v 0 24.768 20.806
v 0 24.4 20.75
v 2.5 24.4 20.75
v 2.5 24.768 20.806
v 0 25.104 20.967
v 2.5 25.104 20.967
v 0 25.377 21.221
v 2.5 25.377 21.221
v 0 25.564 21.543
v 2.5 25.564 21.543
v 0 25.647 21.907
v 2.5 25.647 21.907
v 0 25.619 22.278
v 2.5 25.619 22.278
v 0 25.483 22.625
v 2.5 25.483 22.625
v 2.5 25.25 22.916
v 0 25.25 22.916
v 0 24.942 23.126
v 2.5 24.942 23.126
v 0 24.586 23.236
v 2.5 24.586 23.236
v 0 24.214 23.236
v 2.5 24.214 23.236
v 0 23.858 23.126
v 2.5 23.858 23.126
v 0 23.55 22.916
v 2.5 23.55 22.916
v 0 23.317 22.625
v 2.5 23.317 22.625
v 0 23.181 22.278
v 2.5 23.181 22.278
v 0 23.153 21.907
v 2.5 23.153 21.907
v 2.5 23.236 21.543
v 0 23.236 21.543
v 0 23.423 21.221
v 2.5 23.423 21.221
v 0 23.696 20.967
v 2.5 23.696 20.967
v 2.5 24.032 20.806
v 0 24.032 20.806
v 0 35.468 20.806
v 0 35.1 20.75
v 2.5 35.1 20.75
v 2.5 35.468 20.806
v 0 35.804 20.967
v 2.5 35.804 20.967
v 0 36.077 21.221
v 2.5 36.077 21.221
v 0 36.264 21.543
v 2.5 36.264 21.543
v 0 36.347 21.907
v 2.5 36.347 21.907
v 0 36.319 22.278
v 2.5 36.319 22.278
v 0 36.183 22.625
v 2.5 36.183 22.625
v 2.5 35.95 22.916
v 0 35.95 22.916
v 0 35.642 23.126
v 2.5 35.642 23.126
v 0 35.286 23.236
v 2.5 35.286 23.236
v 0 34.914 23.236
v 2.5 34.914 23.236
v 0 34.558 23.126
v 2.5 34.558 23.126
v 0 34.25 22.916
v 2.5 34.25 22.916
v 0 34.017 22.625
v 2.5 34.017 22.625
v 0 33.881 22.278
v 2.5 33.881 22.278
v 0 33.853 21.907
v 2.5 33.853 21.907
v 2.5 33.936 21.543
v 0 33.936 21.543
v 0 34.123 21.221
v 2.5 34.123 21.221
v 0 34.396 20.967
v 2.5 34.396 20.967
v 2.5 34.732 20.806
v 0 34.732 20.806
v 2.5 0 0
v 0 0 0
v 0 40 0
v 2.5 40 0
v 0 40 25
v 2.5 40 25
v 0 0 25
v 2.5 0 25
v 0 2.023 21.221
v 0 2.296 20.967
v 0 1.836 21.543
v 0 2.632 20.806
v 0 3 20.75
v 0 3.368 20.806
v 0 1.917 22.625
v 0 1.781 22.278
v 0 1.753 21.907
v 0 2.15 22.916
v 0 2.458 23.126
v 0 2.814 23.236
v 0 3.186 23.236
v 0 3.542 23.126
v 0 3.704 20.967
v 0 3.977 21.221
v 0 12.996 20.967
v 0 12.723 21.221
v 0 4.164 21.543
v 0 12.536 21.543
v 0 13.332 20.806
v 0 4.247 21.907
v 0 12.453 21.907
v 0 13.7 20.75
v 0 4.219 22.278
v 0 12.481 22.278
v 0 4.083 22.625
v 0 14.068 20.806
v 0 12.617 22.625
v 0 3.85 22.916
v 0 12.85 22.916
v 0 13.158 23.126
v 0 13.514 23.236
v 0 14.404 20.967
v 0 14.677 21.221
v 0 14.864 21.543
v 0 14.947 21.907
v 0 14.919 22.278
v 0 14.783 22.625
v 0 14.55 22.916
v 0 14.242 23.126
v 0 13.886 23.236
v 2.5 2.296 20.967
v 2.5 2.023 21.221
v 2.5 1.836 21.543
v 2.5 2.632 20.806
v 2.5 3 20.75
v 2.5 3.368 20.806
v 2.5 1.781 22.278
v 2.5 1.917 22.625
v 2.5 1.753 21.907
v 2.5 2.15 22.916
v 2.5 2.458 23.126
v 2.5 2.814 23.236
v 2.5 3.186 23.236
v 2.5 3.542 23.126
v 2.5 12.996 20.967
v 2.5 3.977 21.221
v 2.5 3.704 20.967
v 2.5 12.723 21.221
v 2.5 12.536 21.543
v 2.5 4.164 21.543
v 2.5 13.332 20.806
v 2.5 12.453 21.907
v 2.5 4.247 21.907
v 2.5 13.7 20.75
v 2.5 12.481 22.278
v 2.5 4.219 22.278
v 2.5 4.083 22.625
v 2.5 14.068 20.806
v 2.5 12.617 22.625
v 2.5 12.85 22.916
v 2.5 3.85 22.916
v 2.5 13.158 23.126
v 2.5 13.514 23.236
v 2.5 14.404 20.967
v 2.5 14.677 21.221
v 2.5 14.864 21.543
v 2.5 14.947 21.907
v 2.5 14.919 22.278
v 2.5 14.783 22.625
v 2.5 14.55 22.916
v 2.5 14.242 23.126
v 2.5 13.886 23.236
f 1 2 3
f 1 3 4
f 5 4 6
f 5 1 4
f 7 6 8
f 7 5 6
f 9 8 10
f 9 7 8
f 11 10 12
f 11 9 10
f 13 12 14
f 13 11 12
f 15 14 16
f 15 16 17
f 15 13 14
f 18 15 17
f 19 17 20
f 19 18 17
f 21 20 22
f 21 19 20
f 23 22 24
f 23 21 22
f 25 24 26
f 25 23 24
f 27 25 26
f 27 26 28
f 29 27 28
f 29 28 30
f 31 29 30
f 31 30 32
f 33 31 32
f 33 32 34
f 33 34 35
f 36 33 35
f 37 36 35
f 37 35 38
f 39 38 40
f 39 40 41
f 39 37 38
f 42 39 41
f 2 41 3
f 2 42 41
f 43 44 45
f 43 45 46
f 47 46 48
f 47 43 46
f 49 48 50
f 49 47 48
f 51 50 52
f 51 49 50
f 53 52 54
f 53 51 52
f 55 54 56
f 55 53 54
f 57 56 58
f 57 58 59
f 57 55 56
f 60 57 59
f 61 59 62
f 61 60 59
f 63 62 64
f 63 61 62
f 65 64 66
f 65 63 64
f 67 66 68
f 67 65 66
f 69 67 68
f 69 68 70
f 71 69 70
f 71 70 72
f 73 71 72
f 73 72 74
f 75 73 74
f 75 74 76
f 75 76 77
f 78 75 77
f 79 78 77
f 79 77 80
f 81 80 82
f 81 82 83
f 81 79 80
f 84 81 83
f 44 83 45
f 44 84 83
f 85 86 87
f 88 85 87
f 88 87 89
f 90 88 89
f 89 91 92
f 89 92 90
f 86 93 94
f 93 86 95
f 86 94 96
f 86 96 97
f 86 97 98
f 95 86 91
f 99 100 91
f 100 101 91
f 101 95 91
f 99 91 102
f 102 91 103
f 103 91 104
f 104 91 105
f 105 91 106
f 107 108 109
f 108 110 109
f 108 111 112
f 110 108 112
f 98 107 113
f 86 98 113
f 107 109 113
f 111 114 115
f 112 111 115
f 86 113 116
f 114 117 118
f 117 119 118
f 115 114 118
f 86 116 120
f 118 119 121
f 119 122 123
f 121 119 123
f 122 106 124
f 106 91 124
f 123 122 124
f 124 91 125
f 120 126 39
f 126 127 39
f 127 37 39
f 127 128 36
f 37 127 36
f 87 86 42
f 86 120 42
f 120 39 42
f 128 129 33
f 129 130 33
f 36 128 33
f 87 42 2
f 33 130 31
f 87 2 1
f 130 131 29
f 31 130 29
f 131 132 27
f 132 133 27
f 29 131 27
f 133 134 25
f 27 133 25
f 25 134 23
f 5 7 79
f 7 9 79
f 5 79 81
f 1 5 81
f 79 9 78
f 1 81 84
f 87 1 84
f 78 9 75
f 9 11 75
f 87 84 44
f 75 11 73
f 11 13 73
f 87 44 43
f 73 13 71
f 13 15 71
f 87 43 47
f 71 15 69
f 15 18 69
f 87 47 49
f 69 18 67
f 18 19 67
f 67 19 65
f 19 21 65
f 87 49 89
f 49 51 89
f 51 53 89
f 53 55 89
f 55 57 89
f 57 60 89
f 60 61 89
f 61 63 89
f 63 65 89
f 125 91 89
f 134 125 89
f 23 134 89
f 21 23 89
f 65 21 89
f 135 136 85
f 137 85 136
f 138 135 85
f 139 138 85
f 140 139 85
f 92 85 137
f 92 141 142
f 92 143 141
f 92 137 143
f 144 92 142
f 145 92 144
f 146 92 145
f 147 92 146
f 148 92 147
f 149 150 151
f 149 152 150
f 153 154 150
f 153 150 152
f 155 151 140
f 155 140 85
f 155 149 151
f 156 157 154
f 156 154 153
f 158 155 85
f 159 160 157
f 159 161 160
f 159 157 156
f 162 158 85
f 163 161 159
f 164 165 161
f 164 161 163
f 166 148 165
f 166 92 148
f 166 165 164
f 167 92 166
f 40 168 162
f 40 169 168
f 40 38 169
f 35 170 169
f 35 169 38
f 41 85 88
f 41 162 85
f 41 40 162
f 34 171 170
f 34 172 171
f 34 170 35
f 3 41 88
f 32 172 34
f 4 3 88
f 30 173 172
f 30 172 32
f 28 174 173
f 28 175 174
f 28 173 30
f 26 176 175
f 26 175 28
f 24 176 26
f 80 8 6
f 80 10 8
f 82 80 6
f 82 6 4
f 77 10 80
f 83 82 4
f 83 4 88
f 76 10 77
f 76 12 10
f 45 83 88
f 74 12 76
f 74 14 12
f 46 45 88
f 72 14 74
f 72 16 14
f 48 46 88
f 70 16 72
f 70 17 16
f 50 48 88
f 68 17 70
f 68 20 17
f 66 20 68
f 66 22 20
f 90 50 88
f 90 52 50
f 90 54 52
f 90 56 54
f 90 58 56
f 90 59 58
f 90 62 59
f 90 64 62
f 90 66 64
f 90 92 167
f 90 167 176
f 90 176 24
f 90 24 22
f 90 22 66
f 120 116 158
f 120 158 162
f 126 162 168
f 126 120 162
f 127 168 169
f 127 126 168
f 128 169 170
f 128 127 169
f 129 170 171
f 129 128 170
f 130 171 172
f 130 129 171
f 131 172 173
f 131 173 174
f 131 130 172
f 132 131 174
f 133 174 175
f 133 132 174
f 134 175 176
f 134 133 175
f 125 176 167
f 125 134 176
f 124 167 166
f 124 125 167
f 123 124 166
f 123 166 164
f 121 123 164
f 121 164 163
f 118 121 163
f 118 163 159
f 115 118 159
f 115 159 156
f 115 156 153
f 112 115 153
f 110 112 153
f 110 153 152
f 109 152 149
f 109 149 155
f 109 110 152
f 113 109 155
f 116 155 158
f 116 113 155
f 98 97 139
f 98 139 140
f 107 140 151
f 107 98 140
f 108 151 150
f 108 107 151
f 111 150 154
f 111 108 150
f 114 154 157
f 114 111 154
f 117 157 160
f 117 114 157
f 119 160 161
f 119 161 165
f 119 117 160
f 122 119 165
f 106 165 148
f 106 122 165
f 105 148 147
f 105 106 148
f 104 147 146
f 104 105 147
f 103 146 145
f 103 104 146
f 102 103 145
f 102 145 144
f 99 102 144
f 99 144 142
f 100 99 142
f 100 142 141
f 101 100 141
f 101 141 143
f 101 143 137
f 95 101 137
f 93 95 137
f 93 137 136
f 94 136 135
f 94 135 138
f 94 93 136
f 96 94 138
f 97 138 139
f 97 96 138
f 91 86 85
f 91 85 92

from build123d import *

# Parameters (mm, degrees)
IZIM1_W                     = 40
IZIM1_H                     = 25
IZIM1_R                     = 1.25
Y_KSEKLIK_EKSTR_ZYON1_DEPTH = 2.5


with BuildPart() as part:
    # Çizim1 → Yükseklik-Ekstrüzyon1 (new body)
    with BuildSketch(Plane.YZ):
        with Locations((20, 12.5)):
            Rectangle(IZIM1_W, IZIM1_H)
        with Locations(Location((3, 22, 0), (0, 0, 270))):
            Circle(IZIM1_R, mode=Mode.SUBTRACT)
        with Locations(Location((13.7, 22, 0), (0, 0, 270))):
            Circle(IZIM1_R, mode=Mode.SUBTRACT)
        with Locations(Location((24.4, 22, 0), (0, 0, 270))):
            Circle(IZIM1_R, mode=Mode.SUBTRACT)
        with Locations(Location((35.1, 22, 0), (0, 0, 270))):
            Circle(IZIM1_R, mode=Mode.SUBTRACT)
    extrude(amount=Y_KSEKLIK_EKSTR_ZYON1_DEPTH)


solid = part.part
